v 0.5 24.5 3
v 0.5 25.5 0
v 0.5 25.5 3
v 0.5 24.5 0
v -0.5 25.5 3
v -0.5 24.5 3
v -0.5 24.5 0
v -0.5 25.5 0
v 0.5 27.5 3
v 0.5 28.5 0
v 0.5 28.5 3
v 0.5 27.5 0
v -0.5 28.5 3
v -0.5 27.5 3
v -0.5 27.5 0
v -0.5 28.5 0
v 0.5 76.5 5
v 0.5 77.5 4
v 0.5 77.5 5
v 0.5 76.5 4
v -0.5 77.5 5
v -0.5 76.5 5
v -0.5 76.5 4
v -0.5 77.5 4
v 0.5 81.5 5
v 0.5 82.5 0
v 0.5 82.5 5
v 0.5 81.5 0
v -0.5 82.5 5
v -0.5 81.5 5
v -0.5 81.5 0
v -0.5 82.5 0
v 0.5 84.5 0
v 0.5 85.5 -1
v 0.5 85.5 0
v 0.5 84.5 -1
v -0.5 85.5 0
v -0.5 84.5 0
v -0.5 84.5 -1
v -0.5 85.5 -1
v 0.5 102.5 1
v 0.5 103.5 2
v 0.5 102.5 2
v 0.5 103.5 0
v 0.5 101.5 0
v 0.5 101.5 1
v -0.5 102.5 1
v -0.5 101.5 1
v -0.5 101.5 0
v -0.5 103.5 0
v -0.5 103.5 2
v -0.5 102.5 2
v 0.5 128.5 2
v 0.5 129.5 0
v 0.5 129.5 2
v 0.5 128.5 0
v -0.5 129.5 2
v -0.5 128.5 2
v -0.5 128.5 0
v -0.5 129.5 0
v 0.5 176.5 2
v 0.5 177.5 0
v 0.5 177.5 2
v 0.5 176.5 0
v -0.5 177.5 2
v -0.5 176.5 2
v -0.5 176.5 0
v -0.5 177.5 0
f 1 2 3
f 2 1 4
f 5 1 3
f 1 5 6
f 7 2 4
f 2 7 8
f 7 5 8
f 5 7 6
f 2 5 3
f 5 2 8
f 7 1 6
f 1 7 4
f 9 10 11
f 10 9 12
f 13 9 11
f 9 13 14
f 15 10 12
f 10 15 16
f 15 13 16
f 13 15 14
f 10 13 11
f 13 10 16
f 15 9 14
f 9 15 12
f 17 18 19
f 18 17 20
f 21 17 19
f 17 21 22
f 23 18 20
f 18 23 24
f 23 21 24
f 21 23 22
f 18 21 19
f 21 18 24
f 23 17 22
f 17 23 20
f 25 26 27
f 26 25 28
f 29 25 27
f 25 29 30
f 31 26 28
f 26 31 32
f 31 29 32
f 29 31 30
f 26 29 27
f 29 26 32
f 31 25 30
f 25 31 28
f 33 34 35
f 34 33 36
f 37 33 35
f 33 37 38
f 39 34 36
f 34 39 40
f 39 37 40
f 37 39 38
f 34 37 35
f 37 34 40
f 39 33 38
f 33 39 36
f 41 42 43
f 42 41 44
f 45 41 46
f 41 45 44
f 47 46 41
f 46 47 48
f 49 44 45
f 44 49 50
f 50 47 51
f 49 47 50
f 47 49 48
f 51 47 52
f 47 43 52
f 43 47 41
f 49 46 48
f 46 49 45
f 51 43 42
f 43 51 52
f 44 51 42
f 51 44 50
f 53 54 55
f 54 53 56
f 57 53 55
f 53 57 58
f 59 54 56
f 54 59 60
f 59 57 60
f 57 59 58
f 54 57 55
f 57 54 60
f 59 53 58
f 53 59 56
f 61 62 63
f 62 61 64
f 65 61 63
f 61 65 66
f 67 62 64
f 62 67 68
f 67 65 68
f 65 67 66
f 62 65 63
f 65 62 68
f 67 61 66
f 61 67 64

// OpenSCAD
union() {
    translate([0, 25, 1.5]) cube([1, 1, 3], center=true);
    translate([0, 28, 1.5]) cube([1, 1, 3], center=true);
    translate([0, 77, 4.5]) color([1, 0, 0]) cube([1, 1, 1], center=true);
    translate([0, 82, 2.5]) cube([1, 1, 5], center=true);
    translate([0, 85, -0.5]) color([0, 0, 1]) cube([1, 1, 1], center=true);
    translate([0, 102, 0.5]) cube([1, 1, 1], center=true);
    translate([0, 103, 1.0]) cube([1, 1, 2], center=true);
    translate([0, 129, 1.0]) cube([1, 1, 2], center=true);
    translate([0, 177, 1.0]) cube([1, 1, 2], center=true);
}
